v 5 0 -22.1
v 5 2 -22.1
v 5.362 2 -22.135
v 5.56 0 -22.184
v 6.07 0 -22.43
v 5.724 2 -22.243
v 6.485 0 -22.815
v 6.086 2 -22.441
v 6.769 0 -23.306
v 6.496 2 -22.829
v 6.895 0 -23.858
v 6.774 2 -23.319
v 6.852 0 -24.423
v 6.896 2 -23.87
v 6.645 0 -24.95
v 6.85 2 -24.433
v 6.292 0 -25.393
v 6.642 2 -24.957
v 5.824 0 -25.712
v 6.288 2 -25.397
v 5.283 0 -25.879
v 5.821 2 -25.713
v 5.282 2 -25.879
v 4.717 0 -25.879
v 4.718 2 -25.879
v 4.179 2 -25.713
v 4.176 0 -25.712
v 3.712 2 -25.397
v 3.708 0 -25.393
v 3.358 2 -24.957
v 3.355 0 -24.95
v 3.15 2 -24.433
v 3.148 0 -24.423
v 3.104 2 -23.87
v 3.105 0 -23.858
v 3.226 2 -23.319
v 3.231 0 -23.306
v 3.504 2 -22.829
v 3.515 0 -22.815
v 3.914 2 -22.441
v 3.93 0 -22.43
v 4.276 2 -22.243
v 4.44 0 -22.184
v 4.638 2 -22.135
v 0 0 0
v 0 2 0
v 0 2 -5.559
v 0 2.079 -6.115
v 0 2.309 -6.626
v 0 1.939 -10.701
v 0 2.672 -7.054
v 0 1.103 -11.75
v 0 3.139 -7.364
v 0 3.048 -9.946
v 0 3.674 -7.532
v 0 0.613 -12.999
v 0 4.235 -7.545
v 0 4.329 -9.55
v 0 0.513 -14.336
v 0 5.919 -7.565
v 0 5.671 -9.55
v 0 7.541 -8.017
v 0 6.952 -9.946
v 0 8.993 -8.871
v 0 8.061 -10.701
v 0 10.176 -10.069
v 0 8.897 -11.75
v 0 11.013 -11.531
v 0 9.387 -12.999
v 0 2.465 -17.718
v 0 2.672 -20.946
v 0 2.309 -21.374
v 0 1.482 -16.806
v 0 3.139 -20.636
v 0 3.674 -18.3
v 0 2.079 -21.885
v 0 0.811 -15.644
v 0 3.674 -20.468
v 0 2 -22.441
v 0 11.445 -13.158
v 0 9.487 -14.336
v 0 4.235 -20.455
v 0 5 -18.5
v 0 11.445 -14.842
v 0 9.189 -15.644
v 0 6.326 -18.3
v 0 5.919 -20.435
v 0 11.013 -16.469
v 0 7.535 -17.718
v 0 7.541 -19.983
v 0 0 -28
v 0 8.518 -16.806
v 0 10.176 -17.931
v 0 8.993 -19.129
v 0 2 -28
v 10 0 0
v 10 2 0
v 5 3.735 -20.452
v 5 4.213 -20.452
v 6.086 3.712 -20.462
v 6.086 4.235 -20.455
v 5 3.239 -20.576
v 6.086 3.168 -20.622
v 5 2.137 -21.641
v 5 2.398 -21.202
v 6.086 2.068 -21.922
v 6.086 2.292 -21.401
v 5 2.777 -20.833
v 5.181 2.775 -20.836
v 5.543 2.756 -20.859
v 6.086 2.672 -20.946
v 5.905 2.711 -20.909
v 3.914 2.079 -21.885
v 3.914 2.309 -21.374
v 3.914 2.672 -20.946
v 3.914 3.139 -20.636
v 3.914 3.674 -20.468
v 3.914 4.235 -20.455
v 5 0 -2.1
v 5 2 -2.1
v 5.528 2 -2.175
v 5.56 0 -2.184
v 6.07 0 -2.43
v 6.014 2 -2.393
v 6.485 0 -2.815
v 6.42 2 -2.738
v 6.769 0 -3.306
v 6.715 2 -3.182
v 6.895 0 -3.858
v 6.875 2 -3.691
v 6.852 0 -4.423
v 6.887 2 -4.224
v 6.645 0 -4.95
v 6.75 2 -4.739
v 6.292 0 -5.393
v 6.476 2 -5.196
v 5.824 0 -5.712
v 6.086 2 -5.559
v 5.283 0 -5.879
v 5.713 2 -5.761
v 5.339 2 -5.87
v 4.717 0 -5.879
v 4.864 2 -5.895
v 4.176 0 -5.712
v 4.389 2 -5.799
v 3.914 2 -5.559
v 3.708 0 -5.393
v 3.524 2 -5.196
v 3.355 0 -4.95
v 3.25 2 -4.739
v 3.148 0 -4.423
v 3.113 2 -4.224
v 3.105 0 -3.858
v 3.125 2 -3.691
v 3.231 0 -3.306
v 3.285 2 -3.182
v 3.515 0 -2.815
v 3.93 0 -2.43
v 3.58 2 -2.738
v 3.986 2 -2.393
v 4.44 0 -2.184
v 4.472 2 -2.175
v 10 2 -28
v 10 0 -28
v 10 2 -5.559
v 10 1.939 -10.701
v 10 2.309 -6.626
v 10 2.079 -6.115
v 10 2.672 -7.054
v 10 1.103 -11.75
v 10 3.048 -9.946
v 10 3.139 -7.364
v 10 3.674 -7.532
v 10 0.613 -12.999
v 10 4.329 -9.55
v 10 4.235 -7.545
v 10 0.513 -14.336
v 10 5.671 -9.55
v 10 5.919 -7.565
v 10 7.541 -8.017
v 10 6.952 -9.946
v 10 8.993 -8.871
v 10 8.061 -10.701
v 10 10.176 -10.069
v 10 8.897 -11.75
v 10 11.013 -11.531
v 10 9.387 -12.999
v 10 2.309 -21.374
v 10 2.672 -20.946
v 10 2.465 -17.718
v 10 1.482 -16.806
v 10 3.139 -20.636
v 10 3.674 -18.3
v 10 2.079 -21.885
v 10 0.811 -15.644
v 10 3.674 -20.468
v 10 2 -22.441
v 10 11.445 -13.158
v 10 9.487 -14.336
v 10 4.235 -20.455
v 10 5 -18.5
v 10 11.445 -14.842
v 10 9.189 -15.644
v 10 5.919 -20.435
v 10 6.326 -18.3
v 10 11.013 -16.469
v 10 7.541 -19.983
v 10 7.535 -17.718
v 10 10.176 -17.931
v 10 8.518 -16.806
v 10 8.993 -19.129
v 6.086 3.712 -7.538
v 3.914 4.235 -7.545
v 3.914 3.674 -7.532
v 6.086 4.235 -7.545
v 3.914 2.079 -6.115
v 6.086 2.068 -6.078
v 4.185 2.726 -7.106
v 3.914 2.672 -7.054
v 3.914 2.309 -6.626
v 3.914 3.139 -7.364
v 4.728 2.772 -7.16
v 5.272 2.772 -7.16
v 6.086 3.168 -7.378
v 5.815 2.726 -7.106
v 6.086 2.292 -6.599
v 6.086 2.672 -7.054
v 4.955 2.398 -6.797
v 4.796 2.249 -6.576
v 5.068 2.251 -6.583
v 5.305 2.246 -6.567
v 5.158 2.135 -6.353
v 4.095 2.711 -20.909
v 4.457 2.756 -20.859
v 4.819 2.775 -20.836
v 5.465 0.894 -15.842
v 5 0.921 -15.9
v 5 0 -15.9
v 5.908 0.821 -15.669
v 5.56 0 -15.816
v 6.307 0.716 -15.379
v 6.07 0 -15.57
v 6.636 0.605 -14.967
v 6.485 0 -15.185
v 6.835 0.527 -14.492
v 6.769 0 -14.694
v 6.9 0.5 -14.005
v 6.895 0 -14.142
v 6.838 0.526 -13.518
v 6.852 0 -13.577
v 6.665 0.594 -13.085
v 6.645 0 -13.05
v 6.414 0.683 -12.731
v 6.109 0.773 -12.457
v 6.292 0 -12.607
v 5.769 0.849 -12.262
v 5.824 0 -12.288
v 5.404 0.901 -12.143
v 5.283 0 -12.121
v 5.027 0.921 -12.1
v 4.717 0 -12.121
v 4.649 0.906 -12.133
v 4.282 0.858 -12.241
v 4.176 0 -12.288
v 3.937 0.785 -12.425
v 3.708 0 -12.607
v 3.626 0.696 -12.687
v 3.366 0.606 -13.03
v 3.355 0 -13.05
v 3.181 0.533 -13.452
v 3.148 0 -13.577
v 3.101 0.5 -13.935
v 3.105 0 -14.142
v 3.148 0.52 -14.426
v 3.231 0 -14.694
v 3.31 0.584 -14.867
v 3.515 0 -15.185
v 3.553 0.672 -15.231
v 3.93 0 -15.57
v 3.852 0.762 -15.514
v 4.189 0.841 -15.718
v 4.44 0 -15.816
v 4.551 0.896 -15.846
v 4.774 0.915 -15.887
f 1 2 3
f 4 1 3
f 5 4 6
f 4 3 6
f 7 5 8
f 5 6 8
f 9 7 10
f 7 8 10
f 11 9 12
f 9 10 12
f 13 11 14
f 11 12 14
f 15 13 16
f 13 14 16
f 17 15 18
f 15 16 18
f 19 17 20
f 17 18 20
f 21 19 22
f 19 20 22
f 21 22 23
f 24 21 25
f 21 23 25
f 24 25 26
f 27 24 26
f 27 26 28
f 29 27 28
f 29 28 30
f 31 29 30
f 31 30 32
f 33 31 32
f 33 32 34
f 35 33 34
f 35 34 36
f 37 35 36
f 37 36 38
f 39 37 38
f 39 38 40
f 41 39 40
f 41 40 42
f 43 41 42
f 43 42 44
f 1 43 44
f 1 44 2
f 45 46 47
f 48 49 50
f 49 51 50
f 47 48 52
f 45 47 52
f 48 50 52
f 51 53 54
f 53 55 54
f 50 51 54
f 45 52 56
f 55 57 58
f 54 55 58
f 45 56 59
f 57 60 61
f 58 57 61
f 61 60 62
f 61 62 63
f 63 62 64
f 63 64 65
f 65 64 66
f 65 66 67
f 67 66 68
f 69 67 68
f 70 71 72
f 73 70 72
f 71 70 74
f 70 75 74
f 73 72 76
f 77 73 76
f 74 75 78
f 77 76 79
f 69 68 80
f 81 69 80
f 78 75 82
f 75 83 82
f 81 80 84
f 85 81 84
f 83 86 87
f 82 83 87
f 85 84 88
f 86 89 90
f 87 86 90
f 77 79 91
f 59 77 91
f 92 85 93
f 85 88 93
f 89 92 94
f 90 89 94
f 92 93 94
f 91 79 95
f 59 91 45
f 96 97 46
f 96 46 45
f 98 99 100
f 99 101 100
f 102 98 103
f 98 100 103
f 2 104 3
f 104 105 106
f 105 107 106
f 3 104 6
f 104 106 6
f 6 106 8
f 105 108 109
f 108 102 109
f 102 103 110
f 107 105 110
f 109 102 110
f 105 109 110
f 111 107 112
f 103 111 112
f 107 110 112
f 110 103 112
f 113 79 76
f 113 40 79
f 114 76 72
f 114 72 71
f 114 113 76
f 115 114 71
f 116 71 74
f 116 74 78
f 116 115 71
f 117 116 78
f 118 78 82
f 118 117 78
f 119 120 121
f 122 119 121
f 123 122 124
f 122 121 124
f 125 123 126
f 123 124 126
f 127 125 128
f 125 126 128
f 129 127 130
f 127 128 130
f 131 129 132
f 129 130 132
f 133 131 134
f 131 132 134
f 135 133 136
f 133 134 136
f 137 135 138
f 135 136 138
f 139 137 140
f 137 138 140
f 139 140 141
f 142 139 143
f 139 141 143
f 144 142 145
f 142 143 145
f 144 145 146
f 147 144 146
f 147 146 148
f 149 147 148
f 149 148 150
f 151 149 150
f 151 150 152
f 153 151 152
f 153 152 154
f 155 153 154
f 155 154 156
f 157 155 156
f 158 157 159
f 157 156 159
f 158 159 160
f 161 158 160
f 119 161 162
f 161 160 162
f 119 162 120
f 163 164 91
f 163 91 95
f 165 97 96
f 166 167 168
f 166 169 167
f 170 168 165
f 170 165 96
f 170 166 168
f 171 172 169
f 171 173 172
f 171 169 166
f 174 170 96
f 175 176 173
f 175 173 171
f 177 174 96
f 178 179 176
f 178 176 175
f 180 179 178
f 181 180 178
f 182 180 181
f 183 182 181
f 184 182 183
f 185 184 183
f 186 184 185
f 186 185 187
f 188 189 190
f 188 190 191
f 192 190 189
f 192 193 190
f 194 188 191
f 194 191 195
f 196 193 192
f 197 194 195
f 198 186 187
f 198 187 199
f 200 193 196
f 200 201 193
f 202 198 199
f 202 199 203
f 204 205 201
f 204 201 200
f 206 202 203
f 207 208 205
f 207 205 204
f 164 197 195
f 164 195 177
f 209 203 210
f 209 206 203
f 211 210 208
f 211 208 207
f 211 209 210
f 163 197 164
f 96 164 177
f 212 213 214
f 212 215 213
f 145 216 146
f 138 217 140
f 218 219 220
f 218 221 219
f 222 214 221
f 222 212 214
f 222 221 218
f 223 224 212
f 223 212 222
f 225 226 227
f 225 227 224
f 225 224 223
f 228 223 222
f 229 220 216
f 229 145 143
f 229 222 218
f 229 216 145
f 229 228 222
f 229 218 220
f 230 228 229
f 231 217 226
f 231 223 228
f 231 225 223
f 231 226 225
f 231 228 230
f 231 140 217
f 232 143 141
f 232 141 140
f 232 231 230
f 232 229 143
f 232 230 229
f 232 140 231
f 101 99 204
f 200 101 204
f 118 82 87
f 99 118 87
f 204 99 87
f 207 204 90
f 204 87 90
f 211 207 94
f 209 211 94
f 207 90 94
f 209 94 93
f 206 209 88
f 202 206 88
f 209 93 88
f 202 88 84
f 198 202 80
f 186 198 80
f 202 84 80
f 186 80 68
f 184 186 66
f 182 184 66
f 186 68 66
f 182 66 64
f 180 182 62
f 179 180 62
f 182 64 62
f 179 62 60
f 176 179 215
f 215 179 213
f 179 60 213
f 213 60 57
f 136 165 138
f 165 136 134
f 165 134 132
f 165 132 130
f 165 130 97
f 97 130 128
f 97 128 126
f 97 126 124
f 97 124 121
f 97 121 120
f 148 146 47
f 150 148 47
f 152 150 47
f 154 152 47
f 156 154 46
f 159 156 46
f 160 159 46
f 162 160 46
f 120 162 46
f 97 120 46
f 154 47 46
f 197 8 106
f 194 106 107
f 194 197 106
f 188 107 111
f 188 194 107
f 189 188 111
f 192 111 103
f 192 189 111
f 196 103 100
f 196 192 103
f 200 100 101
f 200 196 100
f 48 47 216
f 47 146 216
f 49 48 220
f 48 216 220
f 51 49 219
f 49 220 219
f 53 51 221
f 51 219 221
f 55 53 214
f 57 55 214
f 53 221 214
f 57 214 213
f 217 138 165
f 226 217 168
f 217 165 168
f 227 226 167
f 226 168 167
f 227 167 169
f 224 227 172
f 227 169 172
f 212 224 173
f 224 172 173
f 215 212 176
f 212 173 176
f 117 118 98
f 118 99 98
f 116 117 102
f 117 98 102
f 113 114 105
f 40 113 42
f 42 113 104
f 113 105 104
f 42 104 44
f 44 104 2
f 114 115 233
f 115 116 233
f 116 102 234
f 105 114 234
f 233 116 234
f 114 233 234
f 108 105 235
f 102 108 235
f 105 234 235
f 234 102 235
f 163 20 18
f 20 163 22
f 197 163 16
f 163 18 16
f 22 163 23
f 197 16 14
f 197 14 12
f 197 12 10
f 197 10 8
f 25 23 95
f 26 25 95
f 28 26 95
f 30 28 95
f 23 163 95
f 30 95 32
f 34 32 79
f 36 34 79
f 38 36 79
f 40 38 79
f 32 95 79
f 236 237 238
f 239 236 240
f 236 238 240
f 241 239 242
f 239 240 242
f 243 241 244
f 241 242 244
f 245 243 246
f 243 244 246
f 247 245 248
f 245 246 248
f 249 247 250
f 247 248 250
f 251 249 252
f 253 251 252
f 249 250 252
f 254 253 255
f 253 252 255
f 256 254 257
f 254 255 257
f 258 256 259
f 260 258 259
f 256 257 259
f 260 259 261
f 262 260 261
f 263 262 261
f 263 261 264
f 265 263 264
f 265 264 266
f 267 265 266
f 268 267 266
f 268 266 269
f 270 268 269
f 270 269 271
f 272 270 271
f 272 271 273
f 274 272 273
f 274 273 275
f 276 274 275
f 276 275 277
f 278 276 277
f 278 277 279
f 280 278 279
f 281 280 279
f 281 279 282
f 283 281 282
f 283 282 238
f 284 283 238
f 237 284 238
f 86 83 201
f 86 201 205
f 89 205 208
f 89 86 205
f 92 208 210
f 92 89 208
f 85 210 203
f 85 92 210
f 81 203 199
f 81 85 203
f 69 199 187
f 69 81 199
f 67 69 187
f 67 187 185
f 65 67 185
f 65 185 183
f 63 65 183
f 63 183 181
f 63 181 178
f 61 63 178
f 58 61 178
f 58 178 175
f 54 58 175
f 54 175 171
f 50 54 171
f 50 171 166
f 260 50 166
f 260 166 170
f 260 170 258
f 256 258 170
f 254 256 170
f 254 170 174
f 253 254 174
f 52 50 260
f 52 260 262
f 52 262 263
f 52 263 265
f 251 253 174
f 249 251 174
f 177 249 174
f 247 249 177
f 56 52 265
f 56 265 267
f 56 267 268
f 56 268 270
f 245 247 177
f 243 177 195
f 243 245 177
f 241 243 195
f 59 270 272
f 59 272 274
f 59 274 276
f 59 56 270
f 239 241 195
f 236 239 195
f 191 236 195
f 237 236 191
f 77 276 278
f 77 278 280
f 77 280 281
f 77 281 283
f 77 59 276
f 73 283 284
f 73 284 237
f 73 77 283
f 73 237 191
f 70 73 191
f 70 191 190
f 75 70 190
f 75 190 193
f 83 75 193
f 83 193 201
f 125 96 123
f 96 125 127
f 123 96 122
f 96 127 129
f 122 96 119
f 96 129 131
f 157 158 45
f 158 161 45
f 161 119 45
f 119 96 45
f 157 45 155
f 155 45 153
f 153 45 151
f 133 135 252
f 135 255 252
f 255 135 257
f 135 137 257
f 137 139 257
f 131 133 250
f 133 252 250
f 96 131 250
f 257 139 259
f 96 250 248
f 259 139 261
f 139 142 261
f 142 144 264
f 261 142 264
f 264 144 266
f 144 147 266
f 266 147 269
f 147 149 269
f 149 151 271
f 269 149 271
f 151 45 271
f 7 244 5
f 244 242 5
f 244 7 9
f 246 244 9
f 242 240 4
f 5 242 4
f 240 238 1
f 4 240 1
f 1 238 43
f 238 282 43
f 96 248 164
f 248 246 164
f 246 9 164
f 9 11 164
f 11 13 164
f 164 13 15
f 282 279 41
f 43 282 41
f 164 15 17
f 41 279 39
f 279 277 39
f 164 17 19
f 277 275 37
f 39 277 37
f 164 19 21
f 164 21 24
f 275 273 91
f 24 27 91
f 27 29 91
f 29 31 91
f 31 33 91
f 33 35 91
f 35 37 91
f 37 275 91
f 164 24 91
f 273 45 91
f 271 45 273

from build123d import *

# Parameters (mm, degrees)
SKETCH1_R           = 4.5
BOSS_EXTRUDE1_DEPTH = 10
SKETCH2_R           = 1.9
CUT_EXTRUDE1_DEPTH  = 10
FILLET1_R           = 2
SKETCH3_R           = 1.9
CUT_EXTRUDE2_DEPTH  = 5


with BuildPart() as part:
    # Sketch1 → Boss-Extrude1 (new body)
    with BuildSketch(Plane(origin=(0, 0, 0), x_dir=(0, 0, -1), z_dir=(1, 0, 0))):
        with BuildLine():
            Line((0, 0), (28, 0))
            Line((28, 0), (28, 2))
            Line((28, 2), (19.766281297, 2))
            ThreePointArc((19.766281297, 2), (14, 11.5), (8.233718703, 2))
            Line((8.233718703, 2), (0, 2))
            Line((0, 2), (0, 0))
        make_face()
        with Locations((14, 5)):
            Circle(SKETCH1_R, mode=Mode.SUBTRACT)
    extrude(amount=BOSS_EXTRUDE1_DEPTH)

    # Sketch2 → Cut-Extrude1 (cut)
    with BuildSketch(Plane(origin=(0, 2, 0), x_dir=(1, 0, 0), z_dir=(0, 1, 0))):
        with Locations(Location((5, 24, 0), (0, 0, 270))):
            Circle(SKETCH2_R)
        with Locations(Location((5, 4, 0), (0, 0, 270))):
            Circle(SKETCH2_R)
    extrude(amount=-CUT_EXTRUDE1_DEPTH, mode=Mode.SUBTRACT)

    # Fillet1
    fillet1_edges = [part.edges().sort_by_distance(p)[0] for p in [
        (5, 2, -8.233718703),
        (5, 2, -19.766281297),
    ]]
    fillet(fillet1_edges, radius=FILLET1_R)

    # Sketch3 → Cut-Extrude2 (cut)
    with BuildSketch(Plane.XZ):
        with Locations(Location((5, -14, 0), (0, 0, 270))):
            Circle(SKETCH3_R)
    extrude(amount=-CUT_EXTRUDE2_DEPTH, mode=Mode.SUBTRACT)


solid = part.part
